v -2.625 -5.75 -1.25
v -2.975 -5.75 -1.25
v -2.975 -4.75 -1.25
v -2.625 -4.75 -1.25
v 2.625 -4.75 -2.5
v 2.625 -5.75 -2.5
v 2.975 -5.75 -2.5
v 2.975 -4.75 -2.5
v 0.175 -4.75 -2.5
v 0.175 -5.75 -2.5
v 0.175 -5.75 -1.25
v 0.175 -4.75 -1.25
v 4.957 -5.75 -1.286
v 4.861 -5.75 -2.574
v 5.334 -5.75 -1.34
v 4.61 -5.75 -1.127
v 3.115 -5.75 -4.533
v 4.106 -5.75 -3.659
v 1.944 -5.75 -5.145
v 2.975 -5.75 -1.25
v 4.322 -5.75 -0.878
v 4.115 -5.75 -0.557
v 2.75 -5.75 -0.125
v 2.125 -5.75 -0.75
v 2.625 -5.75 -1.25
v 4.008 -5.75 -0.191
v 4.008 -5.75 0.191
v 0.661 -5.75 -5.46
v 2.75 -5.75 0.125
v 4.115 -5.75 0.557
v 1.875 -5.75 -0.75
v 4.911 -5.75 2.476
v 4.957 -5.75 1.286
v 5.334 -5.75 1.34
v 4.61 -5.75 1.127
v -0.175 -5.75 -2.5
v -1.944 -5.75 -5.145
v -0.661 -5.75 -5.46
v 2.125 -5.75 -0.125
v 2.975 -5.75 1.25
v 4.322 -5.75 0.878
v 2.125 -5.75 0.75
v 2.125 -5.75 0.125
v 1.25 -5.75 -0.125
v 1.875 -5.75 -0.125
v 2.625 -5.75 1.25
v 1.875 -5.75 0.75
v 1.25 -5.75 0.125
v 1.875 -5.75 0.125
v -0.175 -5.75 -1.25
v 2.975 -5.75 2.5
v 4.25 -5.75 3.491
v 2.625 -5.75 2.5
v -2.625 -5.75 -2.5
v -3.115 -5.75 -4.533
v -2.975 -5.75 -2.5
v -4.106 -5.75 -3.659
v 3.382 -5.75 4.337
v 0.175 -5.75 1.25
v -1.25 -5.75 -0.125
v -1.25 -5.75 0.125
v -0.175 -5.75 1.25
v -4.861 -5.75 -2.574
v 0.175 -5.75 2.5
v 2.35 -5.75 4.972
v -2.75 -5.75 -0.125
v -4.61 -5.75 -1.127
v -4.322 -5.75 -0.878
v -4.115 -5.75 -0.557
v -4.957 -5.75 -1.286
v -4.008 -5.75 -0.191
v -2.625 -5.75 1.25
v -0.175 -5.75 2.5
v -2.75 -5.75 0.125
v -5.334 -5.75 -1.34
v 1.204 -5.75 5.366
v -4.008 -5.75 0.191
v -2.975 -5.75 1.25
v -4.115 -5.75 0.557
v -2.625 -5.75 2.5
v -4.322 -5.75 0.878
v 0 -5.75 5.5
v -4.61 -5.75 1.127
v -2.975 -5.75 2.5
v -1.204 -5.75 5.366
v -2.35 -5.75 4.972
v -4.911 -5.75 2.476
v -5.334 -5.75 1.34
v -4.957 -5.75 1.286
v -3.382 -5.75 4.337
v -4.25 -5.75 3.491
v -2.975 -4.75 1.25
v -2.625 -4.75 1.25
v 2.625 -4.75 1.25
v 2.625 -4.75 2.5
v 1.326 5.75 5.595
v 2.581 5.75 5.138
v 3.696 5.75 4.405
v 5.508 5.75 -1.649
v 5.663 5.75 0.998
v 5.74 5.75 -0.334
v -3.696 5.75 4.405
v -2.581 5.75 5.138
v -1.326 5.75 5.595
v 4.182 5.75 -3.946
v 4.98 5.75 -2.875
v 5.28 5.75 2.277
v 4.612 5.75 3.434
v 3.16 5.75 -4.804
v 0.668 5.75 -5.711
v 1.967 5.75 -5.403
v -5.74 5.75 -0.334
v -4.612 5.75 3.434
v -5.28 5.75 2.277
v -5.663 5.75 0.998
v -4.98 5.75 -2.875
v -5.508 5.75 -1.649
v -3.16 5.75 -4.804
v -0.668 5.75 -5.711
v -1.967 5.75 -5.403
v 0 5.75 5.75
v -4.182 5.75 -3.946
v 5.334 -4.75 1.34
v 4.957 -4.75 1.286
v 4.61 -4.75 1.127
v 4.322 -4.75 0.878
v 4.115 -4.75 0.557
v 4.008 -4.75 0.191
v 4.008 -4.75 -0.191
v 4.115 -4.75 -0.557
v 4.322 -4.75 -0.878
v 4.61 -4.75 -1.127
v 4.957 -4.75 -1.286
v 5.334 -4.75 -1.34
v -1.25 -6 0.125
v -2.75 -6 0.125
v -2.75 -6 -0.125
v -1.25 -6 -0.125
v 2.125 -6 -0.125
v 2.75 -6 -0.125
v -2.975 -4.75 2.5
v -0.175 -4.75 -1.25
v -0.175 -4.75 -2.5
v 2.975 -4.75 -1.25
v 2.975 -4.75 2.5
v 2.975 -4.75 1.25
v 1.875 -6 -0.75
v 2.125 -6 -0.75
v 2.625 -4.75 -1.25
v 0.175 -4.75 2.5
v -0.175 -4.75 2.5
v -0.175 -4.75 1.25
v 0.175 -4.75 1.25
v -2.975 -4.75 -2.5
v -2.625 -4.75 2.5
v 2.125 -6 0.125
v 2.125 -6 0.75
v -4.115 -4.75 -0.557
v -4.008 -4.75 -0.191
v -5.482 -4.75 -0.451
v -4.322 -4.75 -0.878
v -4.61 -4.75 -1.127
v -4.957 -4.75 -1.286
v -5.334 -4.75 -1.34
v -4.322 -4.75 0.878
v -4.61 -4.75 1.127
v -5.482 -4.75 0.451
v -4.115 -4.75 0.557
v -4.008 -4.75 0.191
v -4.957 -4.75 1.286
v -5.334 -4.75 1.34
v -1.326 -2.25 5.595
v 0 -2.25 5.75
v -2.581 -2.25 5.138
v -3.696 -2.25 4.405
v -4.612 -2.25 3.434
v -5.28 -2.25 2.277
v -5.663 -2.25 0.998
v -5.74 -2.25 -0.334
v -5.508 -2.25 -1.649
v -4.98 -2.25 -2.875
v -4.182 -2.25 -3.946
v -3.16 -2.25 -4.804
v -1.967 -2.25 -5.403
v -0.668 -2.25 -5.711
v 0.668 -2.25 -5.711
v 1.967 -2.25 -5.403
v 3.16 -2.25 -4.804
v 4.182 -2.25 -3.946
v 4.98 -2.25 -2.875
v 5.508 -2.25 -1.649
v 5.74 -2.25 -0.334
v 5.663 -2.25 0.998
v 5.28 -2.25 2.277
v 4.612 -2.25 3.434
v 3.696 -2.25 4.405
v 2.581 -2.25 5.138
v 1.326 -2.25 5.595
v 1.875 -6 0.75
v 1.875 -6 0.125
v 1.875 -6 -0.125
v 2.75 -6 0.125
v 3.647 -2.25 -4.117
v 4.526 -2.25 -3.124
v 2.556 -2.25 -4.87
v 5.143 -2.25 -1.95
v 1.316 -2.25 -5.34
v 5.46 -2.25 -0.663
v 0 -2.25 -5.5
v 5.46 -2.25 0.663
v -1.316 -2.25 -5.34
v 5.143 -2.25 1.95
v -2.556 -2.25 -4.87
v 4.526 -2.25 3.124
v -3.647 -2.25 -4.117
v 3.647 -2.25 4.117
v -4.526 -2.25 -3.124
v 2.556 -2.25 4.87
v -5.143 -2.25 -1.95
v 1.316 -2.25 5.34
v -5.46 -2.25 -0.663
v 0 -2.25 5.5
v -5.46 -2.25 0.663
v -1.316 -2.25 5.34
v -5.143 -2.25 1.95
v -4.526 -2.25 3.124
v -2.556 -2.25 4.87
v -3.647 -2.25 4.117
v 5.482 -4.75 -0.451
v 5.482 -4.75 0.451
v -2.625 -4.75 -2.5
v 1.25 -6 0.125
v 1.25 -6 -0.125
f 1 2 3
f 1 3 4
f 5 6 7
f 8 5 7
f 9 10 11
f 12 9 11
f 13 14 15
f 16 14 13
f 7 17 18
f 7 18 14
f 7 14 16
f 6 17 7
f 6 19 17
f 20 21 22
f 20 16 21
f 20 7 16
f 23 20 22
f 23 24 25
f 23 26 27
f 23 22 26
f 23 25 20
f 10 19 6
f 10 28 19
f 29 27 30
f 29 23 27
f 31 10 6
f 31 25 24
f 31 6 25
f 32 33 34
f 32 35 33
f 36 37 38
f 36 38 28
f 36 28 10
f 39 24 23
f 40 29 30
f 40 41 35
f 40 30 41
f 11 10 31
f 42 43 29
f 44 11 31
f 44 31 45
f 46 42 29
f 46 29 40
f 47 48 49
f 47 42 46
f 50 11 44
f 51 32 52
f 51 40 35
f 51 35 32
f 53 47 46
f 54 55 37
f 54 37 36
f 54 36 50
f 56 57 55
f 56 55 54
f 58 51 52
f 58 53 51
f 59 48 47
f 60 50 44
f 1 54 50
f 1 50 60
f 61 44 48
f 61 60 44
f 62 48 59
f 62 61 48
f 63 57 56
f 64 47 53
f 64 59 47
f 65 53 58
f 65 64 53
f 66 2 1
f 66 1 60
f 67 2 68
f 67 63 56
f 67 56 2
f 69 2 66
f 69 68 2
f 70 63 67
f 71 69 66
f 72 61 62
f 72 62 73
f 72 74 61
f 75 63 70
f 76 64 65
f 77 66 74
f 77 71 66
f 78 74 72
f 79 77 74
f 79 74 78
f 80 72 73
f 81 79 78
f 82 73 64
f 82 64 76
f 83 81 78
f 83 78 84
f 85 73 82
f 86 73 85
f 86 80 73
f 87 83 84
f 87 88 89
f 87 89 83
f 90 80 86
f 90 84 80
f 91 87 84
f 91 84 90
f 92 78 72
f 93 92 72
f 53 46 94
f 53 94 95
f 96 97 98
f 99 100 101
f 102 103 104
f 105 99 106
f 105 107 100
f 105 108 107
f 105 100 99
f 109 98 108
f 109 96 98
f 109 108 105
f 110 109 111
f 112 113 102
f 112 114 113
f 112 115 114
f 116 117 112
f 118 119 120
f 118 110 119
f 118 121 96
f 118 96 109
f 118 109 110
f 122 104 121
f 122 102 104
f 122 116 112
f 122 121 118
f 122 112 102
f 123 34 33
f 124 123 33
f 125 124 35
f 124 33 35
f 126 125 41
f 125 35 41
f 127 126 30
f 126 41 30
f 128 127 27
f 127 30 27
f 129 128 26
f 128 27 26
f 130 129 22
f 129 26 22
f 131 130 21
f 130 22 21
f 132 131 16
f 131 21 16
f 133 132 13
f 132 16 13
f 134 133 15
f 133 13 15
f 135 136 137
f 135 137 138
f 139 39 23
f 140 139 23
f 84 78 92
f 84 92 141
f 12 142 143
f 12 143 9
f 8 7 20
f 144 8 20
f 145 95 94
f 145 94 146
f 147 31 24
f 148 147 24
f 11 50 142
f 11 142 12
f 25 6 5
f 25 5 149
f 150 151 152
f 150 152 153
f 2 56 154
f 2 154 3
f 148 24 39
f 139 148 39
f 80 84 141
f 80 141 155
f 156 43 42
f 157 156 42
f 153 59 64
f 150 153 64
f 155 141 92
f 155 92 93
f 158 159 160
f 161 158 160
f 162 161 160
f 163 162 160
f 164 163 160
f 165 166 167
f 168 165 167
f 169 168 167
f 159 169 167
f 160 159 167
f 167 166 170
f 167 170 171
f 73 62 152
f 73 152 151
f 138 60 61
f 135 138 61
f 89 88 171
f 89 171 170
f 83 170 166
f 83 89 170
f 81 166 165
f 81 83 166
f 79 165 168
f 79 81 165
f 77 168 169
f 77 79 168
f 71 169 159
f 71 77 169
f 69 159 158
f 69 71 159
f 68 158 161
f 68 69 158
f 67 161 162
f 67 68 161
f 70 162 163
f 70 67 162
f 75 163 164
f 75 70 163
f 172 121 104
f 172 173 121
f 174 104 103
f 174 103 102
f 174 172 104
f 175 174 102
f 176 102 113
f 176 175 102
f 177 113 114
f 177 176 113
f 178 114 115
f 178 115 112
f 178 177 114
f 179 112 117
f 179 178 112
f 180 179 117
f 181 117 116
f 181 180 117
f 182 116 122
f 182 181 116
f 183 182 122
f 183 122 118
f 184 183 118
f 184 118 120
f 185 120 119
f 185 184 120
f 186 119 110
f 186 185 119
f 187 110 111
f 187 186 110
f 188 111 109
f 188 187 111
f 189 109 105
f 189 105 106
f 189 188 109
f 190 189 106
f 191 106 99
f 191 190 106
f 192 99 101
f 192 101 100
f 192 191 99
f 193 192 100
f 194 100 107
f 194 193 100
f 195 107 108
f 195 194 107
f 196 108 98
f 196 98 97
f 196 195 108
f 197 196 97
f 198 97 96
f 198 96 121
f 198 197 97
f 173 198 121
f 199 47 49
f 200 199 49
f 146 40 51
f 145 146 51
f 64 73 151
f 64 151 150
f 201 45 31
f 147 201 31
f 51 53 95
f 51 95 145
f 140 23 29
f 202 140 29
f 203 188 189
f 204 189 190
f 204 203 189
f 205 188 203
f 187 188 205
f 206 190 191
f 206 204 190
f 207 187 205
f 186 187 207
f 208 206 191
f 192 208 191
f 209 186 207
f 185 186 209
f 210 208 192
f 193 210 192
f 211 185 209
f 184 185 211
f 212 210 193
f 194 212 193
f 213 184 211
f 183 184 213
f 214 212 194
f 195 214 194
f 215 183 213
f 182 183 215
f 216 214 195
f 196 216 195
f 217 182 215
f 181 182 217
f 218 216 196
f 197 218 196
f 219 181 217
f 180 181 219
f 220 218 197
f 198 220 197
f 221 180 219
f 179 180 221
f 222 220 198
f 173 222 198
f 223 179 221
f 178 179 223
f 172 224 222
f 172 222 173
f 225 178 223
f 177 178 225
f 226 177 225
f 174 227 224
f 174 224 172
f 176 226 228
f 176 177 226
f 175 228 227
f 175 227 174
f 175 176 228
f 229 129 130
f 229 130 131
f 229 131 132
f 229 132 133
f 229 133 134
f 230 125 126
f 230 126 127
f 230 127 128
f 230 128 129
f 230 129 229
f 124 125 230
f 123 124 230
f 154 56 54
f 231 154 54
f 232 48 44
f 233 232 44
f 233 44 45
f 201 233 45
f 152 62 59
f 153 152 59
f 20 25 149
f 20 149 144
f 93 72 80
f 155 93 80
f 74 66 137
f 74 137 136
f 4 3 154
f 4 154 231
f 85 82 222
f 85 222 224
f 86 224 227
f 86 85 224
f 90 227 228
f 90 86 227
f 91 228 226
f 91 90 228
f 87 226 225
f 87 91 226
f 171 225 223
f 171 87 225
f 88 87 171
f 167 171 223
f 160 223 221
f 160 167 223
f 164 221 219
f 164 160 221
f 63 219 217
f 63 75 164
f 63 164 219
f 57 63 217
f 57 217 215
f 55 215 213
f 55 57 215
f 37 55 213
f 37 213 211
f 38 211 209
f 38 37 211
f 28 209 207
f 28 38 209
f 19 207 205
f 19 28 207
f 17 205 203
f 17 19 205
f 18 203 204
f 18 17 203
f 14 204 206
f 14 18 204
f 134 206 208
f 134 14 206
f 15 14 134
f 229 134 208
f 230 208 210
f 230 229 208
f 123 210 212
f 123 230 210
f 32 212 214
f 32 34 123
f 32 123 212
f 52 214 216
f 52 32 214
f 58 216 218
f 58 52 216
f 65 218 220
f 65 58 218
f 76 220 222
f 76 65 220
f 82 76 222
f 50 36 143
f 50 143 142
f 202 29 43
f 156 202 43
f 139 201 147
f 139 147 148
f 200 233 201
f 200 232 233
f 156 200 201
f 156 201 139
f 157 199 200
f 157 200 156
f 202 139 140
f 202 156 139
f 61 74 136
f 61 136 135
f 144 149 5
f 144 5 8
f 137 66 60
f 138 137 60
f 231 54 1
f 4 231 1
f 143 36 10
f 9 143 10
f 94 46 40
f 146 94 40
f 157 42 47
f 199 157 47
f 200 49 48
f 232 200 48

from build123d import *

# Parameters (mm, degrees)
SKETCH2_W           = 0.35
SKETCH2_H           = 1.25
CUT_EXTRUDE1_DEPTH  = 1
SKETCH3_W           = 1.5
SKETCH3_H           = 0.25
BOSS_EXTRUDE1_DEPTH = 0.25


with BuildPart() as part:
    # Sketch1 → Revolve1 (revolve)
    with BuildSketch(Plane(origin=(0, 0, 0), x_dir=(0, 0, -1), z_dir=(1, 0, 0))):
        Polygon((0, 5.75), (-5.75, 5.75), (-5.75, -2.25), (-5.5, -2.25), (-5.5, -5.75), (0, -5.75), align=None)
    revolve(axis=Axis((0, 5.75, 0), (0, -1, 0)))

    # Sketch2 → Cut-Extrude1 (cut)
    with BuildSketch(Plane.XZ.offset(5.75)):
        with Locations((0, -1.875)):
            Rectangle(SKETCH2_W, SKETCH2_H)
        with Locations((2.8, 1.875)):
            Rectangle(SKETCH2_W, SKETCH2_H)
        with Locations((0, 1.875)):
            Rectangle(SKETCH2_W, SKETCH2_H)
        with Locations((2.8, -1.875)):
            Rectangle(SKETCH2_W, SKETCH2_H)
        with Locations((-2.8, -1.875)):
            Rectangle(SKETCH2_W, SKETCH2_H)
        with Locations((-2.8, 1.875)):
            Rectangle(SKETCH2_W, SKETCH2_H)
        with BuildLine():
            ThreePointArc((5.334266585, 1.34), (3.994266585, 0), (5.334266585, -1.34))
            ThreePointArc((5.334266585, -1.34), (5.5, 0), (5.334266585, 1.34))
        make_face()
        with BuildLine():
            ThreePointArc((-5.334266585, 1.34), (-3.994266585, 0), (-5.334266585, -1.34))
            ThreePointArc((-5.334266585, -1.34), (-5.5, 0), (-5.334266585, 1.34))
        make_face()
    extrude(amount=-CUT_EXTRUDE1_DEPTH, mode=Mode.SUBTRACT)

    # Sketch3 → Boss-Extrude1 (add)
    with BuildSketch(Plane.XZ.offset(5.75)):
        Polygon((1.25, -0.125), (1.875, -0.125), (1.875, -0.75), (2.125, -0.75), (2.125, -0.125), (2.75, -0.125), (2.75, 0.125), (2.125, 0.125), (2.125, 0.75), (1.875, 0.75), (1.875, 0.125), (1.25, 0.125), align=None)
        with Locations((-2, 0)):
            Rectangle(SKETCH3_W, SKETCH3_H)
    extrude(amount=BOSS_EXTRUDE1_DEPTH)


solid = part.part
